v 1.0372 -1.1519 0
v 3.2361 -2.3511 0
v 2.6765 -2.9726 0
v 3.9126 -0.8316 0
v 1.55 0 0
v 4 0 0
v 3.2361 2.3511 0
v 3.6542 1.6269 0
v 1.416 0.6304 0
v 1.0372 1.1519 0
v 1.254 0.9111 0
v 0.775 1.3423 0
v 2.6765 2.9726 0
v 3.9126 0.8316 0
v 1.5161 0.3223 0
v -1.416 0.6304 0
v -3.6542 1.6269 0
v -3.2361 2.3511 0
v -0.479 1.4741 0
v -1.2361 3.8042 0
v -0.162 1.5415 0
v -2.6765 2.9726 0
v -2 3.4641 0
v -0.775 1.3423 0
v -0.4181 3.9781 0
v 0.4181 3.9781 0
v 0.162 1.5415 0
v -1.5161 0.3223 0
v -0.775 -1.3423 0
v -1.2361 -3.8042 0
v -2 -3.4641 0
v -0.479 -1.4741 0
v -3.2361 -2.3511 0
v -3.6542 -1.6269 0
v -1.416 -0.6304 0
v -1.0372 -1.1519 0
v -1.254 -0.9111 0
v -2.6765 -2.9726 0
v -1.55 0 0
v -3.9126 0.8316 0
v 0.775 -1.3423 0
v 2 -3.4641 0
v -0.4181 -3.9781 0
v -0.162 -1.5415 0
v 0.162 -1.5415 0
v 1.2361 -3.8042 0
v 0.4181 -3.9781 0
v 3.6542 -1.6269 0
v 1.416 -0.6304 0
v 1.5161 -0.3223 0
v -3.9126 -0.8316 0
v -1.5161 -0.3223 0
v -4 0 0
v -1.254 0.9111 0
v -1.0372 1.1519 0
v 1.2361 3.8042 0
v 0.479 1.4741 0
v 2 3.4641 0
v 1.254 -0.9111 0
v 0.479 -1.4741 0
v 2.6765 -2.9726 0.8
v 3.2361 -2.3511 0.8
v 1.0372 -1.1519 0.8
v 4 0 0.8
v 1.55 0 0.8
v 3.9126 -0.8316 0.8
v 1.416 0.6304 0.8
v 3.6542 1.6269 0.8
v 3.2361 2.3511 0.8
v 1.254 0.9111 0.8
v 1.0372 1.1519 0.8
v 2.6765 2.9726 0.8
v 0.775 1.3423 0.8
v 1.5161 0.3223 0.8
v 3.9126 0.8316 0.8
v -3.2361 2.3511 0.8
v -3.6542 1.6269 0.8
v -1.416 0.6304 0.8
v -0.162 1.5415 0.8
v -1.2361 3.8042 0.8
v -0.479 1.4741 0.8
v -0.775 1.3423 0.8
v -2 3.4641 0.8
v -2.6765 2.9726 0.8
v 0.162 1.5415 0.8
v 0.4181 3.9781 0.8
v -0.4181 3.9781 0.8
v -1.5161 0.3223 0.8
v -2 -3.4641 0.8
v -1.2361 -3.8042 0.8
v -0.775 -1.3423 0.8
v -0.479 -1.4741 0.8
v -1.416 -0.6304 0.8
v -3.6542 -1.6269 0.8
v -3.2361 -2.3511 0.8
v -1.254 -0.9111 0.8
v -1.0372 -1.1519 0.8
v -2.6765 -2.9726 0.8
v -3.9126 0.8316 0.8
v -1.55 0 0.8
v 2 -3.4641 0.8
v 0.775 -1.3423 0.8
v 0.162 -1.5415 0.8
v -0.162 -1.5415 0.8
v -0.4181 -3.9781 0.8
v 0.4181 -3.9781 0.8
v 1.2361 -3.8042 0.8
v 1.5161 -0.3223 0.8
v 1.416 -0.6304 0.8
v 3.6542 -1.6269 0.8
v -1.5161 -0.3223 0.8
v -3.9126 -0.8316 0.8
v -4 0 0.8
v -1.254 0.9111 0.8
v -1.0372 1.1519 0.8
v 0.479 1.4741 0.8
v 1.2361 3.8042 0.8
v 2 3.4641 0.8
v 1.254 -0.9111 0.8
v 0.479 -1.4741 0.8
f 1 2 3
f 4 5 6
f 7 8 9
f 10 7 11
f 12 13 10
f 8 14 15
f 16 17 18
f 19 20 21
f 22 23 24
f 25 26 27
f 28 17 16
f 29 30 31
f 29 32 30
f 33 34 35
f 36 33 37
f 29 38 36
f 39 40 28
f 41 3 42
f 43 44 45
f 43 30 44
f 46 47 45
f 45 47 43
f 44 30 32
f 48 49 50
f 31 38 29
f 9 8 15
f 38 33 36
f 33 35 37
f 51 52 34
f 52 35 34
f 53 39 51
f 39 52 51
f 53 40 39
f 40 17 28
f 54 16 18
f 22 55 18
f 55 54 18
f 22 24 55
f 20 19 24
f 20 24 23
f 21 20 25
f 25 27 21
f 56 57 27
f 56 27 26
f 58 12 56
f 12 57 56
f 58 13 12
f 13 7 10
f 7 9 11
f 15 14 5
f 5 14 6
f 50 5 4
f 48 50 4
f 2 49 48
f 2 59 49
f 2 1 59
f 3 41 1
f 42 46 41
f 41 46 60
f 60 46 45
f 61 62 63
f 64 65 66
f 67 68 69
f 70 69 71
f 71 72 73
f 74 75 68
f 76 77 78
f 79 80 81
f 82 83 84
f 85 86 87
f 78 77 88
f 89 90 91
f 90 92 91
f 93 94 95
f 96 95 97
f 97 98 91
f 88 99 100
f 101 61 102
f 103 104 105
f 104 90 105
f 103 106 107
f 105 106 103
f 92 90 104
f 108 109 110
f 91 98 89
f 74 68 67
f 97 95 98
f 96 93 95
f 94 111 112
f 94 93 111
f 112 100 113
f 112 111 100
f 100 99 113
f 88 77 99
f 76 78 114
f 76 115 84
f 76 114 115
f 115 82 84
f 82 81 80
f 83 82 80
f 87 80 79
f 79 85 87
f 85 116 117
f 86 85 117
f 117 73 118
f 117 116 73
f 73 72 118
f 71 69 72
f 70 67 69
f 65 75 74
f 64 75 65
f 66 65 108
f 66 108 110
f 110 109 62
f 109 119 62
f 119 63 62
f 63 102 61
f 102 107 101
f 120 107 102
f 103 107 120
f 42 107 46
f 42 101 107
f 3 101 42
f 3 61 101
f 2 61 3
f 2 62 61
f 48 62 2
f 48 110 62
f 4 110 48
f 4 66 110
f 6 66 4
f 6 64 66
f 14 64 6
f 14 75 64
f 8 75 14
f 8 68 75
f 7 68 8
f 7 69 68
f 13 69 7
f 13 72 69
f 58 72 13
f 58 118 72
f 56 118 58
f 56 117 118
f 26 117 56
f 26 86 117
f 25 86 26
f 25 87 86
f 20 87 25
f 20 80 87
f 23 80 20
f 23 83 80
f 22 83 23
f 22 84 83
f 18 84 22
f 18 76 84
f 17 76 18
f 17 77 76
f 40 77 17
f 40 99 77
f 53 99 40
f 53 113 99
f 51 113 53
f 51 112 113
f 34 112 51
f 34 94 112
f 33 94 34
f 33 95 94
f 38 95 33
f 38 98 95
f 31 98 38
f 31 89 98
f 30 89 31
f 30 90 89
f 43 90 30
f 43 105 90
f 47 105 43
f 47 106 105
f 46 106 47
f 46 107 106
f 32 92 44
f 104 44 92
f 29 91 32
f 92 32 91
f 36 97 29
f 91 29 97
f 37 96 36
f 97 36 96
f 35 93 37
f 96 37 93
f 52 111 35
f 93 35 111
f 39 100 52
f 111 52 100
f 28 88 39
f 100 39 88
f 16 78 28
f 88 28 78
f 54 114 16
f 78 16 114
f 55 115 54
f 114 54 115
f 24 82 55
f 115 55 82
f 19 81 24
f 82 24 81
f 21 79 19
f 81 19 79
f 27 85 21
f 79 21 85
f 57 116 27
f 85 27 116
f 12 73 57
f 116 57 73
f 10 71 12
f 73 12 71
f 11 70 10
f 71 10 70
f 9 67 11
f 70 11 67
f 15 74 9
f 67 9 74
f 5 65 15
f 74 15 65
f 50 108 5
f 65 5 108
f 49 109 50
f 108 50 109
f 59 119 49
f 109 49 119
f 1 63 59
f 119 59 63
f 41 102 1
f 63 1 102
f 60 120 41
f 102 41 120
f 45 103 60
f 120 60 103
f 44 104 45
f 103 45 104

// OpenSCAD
internalDiameter = 3.1;
externalDiameter = 8;
thickness = 0.8;

linear_extrude(thickness) {
    scale(.1) { // scale for increased resolution
        difference() {
            circle(d=externalDiameter*10);
            circle(d=internalDiameter*10);
        }
    }
}
